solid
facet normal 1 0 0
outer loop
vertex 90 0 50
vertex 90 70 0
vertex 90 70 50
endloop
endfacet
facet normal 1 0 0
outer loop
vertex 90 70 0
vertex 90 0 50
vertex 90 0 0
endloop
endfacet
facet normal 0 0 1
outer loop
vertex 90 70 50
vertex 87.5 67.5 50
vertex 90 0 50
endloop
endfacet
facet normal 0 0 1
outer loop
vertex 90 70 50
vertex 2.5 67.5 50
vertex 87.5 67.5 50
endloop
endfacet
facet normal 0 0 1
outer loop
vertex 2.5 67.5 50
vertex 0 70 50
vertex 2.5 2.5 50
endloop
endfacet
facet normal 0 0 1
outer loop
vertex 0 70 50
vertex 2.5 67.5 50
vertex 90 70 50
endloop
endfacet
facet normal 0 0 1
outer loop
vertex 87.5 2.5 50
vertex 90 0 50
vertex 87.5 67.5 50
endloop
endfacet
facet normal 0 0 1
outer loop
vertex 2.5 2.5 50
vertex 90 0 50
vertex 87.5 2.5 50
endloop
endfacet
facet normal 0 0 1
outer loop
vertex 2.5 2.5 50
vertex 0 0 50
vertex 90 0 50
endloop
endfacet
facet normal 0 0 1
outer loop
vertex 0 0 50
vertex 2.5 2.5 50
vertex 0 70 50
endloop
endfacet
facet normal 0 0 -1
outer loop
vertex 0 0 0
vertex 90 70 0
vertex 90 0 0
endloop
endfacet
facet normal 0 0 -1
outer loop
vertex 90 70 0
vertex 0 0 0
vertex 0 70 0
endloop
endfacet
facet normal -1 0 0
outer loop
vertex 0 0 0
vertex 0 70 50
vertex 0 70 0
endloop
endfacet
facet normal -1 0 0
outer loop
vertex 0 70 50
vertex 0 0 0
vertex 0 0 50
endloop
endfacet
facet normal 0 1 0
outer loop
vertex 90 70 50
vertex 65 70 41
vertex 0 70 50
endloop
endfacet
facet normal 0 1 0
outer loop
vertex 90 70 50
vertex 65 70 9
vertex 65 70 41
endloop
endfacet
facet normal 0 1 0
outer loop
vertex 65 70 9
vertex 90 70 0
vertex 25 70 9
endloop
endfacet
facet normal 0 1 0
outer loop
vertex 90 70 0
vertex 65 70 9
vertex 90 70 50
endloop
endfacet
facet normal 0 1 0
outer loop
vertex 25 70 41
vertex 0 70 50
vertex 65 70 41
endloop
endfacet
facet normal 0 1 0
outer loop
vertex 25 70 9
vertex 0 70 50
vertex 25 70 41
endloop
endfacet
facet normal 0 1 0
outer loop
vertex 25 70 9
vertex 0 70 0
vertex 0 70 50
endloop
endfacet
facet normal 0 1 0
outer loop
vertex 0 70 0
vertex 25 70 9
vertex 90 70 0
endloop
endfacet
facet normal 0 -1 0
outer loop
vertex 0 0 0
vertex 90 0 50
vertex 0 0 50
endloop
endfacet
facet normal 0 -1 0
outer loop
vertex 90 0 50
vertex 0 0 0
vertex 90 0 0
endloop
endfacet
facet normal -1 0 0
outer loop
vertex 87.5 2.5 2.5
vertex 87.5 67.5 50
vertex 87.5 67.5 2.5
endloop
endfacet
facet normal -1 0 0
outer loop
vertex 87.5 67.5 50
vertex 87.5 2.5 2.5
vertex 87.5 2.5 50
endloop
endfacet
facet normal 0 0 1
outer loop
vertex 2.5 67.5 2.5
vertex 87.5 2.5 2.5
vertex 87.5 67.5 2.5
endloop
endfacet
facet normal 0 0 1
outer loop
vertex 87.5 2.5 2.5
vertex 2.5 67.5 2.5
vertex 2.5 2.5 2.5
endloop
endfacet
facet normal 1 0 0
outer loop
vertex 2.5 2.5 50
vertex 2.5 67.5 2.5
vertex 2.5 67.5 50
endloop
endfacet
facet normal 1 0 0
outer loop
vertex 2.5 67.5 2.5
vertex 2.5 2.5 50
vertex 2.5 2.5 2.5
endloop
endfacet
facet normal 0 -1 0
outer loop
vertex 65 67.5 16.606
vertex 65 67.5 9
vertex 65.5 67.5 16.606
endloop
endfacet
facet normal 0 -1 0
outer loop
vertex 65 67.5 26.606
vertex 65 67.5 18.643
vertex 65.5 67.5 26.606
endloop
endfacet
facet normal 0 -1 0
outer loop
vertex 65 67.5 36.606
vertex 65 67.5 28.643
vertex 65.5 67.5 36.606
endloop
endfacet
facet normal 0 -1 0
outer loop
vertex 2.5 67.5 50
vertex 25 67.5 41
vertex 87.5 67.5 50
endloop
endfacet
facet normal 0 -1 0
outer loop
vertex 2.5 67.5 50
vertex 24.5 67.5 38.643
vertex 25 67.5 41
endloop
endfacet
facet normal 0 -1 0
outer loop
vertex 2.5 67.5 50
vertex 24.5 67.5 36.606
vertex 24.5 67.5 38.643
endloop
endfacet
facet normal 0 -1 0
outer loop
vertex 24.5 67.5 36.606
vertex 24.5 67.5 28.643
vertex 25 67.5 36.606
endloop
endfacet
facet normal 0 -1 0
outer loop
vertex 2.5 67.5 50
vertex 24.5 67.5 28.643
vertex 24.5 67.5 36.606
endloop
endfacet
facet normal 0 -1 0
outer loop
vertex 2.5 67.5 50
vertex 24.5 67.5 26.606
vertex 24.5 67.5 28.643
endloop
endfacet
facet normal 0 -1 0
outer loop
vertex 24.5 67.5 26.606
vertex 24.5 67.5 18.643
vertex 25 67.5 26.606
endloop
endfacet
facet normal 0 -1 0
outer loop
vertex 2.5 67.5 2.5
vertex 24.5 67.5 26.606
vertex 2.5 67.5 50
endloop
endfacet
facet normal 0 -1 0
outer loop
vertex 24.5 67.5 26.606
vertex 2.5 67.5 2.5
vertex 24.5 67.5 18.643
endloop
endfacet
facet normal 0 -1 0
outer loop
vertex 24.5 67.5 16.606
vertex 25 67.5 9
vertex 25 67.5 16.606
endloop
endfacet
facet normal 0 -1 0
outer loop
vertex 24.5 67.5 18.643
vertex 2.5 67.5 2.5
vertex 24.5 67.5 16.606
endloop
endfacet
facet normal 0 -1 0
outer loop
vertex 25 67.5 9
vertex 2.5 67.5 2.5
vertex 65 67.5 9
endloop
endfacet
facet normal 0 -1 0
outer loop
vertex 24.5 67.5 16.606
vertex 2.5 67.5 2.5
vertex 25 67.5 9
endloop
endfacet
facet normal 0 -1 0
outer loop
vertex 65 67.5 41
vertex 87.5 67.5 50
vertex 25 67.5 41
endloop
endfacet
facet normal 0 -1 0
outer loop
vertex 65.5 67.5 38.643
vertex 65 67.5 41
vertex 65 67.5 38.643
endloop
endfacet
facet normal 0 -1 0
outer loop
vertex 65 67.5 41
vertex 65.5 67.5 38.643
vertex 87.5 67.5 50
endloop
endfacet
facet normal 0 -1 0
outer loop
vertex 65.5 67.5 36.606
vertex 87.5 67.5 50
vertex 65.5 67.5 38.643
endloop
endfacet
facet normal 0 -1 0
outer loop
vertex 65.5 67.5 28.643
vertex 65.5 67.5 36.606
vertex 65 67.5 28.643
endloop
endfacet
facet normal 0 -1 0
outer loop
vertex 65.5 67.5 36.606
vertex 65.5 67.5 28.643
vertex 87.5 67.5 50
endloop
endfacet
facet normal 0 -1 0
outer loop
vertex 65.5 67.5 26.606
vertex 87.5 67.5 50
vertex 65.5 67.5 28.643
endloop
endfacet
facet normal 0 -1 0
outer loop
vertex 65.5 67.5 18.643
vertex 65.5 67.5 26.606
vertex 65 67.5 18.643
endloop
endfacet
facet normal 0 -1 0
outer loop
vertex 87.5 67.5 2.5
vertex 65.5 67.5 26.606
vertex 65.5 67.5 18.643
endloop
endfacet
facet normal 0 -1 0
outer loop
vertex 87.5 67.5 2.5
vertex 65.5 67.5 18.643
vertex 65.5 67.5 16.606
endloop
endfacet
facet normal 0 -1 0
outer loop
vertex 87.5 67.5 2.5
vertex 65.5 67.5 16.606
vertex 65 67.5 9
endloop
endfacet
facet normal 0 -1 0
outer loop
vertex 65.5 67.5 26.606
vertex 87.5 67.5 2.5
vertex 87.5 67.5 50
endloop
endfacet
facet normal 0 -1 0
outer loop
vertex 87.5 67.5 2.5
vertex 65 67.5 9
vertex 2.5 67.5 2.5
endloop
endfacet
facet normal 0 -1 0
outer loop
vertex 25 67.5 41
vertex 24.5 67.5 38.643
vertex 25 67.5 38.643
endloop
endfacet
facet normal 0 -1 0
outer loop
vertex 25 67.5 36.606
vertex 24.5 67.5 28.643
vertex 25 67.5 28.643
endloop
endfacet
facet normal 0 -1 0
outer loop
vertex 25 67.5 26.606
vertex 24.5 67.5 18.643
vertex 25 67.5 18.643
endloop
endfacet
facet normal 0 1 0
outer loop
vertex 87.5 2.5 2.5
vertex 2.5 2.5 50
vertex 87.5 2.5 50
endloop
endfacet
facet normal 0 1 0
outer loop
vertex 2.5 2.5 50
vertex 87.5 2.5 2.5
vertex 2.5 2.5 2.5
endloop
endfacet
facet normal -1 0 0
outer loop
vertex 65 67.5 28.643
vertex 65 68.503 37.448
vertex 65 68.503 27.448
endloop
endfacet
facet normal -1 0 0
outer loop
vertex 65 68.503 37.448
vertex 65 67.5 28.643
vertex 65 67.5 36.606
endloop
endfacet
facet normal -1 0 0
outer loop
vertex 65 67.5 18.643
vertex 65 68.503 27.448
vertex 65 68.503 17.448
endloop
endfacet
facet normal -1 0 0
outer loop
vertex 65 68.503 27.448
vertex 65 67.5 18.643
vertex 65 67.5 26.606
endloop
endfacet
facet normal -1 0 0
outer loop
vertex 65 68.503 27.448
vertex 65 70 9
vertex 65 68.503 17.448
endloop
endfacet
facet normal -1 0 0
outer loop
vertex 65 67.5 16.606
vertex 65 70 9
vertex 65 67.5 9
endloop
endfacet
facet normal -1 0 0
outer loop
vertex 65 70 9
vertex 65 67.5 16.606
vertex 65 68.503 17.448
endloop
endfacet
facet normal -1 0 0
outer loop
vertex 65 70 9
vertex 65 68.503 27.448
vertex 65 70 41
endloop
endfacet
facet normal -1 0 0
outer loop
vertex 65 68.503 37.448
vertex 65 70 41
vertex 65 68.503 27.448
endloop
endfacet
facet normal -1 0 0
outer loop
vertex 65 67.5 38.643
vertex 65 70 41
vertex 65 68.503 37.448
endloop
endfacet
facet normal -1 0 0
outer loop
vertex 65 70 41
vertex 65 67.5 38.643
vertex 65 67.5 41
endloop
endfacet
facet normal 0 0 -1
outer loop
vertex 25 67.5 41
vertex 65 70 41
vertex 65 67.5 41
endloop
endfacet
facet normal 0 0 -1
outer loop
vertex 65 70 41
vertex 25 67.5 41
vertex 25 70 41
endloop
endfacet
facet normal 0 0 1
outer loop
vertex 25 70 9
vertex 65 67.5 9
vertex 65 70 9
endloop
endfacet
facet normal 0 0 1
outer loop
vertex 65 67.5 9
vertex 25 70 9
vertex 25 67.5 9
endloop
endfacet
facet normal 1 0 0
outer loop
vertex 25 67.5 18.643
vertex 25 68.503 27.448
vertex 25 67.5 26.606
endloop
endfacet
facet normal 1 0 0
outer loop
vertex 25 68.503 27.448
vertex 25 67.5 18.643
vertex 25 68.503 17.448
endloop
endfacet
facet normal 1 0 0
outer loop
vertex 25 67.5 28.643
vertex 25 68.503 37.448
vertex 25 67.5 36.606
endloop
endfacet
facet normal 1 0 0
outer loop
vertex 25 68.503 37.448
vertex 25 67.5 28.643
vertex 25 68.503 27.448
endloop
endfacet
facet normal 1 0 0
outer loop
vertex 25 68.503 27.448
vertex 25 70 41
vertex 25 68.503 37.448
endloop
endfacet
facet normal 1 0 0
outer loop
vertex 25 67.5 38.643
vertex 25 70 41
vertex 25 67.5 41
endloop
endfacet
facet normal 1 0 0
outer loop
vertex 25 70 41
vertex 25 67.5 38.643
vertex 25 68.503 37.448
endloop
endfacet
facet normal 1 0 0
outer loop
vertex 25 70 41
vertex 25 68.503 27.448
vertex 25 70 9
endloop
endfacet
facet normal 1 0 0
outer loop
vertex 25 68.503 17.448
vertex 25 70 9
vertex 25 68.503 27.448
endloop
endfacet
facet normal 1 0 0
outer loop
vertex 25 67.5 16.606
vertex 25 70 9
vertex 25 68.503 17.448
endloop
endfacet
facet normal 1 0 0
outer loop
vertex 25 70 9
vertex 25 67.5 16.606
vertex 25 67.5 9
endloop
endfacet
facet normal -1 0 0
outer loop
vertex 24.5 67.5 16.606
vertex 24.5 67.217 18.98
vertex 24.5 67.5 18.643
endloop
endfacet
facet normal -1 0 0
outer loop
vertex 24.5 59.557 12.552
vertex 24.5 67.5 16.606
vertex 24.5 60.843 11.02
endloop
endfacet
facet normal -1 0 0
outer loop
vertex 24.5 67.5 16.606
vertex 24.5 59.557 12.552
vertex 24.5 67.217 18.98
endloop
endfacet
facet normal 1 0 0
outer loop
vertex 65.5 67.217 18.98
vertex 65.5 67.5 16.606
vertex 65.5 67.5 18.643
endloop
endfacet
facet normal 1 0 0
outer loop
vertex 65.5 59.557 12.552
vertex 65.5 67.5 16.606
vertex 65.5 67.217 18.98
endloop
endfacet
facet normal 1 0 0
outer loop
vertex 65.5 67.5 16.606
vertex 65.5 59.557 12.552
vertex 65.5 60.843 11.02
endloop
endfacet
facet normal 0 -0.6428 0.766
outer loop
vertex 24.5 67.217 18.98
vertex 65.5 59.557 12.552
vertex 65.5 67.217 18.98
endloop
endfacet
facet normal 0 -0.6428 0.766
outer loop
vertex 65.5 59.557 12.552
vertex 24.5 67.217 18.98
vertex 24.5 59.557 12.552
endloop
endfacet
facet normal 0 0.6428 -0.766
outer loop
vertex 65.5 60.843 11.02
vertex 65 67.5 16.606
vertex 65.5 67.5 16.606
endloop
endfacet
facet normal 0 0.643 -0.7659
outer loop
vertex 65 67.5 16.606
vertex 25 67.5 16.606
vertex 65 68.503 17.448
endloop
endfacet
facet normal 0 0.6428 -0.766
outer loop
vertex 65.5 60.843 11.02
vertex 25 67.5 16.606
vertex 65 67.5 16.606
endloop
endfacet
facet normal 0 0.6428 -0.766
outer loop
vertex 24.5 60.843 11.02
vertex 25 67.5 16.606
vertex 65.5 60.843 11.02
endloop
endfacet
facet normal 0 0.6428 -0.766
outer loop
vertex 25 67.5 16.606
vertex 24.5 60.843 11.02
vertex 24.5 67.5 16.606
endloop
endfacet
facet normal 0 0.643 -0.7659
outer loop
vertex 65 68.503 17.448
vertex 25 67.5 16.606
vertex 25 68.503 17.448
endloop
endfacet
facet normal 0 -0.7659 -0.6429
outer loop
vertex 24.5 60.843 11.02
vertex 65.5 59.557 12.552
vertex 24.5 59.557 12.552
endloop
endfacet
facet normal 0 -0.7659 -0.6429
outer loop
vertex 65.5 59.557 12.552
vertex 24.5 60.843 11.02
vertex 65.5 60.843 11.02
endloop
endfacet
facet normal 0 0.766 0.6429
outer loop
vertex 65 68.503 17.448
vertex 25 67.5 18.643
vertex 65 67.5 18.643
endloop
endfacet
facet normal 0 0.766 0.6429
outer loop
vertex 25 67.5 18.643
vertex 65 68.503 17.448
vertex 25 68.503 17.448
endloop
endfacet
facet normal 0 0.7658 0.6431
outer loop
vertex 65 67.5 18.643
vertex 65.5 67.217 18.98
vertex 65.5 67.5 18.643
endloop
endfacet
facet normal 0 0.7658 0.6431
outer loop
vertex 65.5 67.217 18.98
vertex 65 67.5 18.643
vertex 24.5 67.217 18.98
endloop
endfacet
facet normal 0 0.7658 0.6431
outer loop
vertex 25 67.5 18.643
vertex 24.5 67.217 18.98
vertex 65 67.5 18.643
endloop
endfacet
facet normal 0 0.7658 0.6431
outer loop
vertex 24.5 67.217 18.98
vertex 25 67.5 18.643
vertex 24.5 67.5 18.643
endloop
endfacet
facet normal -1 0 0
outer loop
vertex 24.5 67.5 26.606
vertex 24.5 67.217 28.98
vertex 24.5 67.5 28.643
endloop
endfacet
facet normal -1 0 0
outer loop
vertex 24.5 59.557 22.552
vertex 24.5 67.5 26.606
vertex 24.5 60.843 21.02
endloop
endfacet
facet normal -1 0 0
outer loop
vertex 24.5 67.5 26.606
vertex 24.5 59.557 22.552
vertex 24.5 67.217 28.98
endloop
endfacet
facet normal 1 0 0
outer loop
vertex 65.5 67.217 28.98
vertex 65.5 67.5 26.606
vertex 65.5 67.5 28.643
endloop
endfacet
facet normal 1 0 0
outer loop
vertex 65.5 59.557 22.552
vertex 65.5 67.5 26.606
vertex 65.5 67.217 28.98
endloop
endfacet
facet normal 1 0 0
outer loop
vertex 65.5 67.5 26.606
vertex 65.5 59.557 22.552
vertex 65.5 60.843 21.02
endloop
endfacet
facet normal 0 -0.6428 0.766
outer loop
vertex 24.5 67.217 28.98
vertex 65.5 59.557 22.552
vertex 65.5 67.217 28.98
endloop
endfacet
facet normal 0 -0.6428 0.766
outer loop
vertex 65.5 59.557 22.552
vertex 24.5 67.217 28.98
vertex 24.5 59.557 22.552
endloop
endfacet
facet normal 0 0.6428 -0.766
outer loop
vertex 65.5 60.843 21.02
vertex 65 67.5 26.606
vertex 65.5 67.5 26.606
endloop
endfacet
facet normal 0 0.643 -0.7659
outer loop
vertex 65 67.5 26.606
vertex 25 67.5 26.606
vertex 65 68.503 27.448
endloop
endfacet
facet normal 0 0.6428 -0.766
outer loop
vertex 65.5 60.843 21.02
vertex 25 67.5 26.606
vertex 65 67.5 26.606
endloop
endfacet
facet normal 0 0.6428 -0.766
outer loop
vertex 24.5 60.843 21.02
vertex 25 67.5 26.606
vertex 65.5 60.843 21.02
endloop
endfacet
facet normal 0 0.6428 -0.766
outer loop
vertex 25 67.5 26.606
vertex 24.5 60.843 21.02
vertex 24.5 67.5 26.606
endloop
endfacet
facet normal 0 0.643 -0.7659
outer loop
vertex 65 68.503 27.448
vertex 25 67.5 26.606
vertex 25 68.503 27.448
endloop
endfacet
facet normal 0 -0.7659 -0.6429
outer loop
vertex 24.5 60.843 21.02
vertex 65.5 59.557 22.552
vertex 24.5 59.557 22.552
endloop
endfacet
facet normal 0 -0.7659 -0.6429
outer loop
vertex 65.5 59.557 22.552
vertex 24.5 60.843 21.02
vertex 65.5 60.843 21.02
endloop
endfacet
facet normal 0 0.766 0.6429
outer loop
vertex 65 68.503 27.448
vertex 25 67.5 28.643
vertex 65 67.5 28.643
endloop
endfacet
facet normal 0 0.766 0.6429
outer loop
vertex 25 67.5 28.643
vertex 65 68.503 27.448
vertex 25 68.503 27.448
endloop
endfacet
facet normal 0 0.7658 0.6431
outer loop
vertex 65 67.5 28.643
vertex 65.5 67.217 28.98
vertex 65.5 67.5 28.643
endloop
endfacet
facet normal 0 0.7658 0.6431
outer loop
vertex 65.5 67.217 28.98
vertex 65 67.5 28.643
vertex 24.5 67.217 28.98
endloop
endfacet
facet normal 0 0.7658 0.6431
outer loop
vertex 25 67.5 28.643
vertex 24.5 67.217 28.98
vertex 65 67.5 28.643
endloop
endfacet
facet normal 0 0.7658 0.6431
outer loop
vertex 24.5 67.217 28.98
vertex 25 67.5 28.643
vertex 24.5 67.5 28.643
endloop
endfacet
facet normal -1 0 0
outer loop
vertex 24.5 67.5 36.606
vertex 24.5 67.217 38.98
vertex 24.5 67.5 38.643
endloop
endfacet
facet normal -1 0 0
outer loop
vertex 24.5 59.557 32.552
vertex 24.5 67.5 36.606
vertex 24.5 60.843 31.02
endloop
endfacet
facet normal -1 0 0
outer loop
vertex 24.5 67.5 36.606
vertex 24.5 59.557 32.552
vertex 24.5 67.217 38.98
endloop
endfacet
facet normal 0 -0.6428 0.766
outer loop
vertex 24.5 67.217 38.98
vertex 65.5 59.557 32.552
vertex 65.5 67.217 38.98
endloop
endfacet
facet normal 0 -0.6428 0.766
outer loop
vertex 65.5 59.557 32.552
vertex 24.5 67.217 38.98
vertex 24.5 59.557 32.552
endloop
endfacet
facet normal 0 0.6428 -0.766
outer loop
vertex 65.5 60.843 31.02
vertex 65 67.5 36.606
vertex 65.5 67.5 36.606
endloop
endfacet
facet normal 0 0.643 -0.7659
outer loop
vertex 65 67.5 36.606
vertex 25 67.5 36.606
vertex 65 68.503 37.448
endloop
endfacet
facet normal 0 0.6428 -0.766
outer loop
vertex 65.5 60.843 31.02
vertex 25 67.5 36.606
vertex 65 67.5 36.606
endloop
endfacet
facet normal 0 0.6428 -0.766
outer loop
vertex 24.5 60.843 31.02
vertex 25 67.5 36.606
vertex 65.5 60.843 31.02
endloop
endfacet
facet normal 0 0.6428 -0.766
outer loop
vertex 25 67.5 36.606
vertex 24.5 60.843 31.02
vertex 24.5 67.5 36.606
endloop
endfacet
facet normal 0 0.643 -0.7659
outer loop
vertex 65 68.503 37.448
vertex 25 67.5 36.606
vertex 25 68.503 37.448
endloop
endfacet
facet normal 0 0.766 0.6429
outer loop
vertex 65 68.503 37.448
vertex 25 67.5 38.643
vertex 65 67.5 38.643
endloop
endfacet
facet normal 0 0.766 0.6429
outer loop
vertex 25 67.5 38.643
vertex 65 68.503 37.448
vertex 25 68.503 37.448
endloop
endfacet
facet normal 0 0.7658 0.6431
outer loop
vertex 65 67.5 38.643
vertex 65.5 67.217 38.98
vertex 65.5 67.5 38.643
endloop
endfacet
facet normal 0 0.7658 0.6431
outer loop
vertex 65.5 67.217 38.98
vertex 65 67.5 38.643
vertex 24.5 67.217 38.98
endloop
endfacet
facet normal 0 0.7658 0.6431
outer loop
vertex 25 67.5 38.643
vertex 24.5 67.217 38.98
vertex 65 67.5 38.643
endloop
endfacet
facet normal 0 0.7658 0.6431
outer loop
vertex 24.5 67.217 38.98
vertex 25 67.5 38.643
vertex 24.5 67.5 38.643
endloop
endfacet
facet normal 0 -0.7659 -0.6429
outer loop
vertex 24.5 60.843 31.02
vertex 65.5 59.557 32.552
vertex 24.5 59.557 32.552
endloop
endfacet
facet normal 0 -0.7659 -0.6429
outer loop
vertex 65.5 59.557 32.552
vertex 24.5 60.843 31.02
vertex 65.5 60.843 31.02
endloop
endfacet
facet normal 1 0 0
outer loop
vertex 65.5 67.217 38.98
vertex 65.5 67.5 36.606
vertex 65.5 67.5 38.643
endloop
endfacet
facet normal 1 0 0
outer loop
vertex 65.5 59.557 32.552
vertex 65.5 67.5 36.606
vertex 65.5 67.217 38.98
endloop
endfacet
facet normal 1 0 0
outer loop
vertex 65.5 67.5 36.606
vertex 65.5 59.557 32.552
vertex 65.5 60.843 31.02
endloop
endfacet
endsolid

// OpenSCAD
$fn = 32;

// ----------------------------------------------------------------------
// Vent box: louvers enclosure
// ----------------------------------------------------------------------

// --- parameters (mm) ---
box_l = 90;               // box length, X
box_w = 70;               // box width, Y
box_h = 50;               // box height, Z
wall_t = 2.5;             // shell wall thickness
win_l = 40;               // vent window width, X
win_h = 32;               // vent window height, Z
slat_t = 2;               // louver slat thickness
slat_d = 10;              // louver slat depth
slat_a = 40;              // louver slat angle, degrees
slat_pitch = 10;          // louver pitch
slat_yc = 64.03;          // slat centreline Y

win_z0 = (box_h - win_h) / 2;  // window lower edge Z
n_slats = 3;  // louver count
slat_z0 = win_z0 + (win_h - (n_slats - 1) * slat_pitch) / 2;

difference() {
  union() {
    difference() {
      cube([box_l, box_w, box_h]);
  translate([wall_t, wall_t, wall_t])
    cube([box_l - 2 * wall_t, box_w - 2 * wall_t, box_h]);
  translate([(box_l - win_l) / 2, box_w - wall_t - 1, win_z0])
    cube([win_l, wall_t + 2, win_h]);
    }
    for (i = [0 : n_slats - 1])
      translate([box_l / 2, slat_yc, slat_z0 + i * slat_pitch])
        rotate([slat_a, 0, 0])
          cube([win_l + 1, slat_d, slat_t], center = true);
  }
}
